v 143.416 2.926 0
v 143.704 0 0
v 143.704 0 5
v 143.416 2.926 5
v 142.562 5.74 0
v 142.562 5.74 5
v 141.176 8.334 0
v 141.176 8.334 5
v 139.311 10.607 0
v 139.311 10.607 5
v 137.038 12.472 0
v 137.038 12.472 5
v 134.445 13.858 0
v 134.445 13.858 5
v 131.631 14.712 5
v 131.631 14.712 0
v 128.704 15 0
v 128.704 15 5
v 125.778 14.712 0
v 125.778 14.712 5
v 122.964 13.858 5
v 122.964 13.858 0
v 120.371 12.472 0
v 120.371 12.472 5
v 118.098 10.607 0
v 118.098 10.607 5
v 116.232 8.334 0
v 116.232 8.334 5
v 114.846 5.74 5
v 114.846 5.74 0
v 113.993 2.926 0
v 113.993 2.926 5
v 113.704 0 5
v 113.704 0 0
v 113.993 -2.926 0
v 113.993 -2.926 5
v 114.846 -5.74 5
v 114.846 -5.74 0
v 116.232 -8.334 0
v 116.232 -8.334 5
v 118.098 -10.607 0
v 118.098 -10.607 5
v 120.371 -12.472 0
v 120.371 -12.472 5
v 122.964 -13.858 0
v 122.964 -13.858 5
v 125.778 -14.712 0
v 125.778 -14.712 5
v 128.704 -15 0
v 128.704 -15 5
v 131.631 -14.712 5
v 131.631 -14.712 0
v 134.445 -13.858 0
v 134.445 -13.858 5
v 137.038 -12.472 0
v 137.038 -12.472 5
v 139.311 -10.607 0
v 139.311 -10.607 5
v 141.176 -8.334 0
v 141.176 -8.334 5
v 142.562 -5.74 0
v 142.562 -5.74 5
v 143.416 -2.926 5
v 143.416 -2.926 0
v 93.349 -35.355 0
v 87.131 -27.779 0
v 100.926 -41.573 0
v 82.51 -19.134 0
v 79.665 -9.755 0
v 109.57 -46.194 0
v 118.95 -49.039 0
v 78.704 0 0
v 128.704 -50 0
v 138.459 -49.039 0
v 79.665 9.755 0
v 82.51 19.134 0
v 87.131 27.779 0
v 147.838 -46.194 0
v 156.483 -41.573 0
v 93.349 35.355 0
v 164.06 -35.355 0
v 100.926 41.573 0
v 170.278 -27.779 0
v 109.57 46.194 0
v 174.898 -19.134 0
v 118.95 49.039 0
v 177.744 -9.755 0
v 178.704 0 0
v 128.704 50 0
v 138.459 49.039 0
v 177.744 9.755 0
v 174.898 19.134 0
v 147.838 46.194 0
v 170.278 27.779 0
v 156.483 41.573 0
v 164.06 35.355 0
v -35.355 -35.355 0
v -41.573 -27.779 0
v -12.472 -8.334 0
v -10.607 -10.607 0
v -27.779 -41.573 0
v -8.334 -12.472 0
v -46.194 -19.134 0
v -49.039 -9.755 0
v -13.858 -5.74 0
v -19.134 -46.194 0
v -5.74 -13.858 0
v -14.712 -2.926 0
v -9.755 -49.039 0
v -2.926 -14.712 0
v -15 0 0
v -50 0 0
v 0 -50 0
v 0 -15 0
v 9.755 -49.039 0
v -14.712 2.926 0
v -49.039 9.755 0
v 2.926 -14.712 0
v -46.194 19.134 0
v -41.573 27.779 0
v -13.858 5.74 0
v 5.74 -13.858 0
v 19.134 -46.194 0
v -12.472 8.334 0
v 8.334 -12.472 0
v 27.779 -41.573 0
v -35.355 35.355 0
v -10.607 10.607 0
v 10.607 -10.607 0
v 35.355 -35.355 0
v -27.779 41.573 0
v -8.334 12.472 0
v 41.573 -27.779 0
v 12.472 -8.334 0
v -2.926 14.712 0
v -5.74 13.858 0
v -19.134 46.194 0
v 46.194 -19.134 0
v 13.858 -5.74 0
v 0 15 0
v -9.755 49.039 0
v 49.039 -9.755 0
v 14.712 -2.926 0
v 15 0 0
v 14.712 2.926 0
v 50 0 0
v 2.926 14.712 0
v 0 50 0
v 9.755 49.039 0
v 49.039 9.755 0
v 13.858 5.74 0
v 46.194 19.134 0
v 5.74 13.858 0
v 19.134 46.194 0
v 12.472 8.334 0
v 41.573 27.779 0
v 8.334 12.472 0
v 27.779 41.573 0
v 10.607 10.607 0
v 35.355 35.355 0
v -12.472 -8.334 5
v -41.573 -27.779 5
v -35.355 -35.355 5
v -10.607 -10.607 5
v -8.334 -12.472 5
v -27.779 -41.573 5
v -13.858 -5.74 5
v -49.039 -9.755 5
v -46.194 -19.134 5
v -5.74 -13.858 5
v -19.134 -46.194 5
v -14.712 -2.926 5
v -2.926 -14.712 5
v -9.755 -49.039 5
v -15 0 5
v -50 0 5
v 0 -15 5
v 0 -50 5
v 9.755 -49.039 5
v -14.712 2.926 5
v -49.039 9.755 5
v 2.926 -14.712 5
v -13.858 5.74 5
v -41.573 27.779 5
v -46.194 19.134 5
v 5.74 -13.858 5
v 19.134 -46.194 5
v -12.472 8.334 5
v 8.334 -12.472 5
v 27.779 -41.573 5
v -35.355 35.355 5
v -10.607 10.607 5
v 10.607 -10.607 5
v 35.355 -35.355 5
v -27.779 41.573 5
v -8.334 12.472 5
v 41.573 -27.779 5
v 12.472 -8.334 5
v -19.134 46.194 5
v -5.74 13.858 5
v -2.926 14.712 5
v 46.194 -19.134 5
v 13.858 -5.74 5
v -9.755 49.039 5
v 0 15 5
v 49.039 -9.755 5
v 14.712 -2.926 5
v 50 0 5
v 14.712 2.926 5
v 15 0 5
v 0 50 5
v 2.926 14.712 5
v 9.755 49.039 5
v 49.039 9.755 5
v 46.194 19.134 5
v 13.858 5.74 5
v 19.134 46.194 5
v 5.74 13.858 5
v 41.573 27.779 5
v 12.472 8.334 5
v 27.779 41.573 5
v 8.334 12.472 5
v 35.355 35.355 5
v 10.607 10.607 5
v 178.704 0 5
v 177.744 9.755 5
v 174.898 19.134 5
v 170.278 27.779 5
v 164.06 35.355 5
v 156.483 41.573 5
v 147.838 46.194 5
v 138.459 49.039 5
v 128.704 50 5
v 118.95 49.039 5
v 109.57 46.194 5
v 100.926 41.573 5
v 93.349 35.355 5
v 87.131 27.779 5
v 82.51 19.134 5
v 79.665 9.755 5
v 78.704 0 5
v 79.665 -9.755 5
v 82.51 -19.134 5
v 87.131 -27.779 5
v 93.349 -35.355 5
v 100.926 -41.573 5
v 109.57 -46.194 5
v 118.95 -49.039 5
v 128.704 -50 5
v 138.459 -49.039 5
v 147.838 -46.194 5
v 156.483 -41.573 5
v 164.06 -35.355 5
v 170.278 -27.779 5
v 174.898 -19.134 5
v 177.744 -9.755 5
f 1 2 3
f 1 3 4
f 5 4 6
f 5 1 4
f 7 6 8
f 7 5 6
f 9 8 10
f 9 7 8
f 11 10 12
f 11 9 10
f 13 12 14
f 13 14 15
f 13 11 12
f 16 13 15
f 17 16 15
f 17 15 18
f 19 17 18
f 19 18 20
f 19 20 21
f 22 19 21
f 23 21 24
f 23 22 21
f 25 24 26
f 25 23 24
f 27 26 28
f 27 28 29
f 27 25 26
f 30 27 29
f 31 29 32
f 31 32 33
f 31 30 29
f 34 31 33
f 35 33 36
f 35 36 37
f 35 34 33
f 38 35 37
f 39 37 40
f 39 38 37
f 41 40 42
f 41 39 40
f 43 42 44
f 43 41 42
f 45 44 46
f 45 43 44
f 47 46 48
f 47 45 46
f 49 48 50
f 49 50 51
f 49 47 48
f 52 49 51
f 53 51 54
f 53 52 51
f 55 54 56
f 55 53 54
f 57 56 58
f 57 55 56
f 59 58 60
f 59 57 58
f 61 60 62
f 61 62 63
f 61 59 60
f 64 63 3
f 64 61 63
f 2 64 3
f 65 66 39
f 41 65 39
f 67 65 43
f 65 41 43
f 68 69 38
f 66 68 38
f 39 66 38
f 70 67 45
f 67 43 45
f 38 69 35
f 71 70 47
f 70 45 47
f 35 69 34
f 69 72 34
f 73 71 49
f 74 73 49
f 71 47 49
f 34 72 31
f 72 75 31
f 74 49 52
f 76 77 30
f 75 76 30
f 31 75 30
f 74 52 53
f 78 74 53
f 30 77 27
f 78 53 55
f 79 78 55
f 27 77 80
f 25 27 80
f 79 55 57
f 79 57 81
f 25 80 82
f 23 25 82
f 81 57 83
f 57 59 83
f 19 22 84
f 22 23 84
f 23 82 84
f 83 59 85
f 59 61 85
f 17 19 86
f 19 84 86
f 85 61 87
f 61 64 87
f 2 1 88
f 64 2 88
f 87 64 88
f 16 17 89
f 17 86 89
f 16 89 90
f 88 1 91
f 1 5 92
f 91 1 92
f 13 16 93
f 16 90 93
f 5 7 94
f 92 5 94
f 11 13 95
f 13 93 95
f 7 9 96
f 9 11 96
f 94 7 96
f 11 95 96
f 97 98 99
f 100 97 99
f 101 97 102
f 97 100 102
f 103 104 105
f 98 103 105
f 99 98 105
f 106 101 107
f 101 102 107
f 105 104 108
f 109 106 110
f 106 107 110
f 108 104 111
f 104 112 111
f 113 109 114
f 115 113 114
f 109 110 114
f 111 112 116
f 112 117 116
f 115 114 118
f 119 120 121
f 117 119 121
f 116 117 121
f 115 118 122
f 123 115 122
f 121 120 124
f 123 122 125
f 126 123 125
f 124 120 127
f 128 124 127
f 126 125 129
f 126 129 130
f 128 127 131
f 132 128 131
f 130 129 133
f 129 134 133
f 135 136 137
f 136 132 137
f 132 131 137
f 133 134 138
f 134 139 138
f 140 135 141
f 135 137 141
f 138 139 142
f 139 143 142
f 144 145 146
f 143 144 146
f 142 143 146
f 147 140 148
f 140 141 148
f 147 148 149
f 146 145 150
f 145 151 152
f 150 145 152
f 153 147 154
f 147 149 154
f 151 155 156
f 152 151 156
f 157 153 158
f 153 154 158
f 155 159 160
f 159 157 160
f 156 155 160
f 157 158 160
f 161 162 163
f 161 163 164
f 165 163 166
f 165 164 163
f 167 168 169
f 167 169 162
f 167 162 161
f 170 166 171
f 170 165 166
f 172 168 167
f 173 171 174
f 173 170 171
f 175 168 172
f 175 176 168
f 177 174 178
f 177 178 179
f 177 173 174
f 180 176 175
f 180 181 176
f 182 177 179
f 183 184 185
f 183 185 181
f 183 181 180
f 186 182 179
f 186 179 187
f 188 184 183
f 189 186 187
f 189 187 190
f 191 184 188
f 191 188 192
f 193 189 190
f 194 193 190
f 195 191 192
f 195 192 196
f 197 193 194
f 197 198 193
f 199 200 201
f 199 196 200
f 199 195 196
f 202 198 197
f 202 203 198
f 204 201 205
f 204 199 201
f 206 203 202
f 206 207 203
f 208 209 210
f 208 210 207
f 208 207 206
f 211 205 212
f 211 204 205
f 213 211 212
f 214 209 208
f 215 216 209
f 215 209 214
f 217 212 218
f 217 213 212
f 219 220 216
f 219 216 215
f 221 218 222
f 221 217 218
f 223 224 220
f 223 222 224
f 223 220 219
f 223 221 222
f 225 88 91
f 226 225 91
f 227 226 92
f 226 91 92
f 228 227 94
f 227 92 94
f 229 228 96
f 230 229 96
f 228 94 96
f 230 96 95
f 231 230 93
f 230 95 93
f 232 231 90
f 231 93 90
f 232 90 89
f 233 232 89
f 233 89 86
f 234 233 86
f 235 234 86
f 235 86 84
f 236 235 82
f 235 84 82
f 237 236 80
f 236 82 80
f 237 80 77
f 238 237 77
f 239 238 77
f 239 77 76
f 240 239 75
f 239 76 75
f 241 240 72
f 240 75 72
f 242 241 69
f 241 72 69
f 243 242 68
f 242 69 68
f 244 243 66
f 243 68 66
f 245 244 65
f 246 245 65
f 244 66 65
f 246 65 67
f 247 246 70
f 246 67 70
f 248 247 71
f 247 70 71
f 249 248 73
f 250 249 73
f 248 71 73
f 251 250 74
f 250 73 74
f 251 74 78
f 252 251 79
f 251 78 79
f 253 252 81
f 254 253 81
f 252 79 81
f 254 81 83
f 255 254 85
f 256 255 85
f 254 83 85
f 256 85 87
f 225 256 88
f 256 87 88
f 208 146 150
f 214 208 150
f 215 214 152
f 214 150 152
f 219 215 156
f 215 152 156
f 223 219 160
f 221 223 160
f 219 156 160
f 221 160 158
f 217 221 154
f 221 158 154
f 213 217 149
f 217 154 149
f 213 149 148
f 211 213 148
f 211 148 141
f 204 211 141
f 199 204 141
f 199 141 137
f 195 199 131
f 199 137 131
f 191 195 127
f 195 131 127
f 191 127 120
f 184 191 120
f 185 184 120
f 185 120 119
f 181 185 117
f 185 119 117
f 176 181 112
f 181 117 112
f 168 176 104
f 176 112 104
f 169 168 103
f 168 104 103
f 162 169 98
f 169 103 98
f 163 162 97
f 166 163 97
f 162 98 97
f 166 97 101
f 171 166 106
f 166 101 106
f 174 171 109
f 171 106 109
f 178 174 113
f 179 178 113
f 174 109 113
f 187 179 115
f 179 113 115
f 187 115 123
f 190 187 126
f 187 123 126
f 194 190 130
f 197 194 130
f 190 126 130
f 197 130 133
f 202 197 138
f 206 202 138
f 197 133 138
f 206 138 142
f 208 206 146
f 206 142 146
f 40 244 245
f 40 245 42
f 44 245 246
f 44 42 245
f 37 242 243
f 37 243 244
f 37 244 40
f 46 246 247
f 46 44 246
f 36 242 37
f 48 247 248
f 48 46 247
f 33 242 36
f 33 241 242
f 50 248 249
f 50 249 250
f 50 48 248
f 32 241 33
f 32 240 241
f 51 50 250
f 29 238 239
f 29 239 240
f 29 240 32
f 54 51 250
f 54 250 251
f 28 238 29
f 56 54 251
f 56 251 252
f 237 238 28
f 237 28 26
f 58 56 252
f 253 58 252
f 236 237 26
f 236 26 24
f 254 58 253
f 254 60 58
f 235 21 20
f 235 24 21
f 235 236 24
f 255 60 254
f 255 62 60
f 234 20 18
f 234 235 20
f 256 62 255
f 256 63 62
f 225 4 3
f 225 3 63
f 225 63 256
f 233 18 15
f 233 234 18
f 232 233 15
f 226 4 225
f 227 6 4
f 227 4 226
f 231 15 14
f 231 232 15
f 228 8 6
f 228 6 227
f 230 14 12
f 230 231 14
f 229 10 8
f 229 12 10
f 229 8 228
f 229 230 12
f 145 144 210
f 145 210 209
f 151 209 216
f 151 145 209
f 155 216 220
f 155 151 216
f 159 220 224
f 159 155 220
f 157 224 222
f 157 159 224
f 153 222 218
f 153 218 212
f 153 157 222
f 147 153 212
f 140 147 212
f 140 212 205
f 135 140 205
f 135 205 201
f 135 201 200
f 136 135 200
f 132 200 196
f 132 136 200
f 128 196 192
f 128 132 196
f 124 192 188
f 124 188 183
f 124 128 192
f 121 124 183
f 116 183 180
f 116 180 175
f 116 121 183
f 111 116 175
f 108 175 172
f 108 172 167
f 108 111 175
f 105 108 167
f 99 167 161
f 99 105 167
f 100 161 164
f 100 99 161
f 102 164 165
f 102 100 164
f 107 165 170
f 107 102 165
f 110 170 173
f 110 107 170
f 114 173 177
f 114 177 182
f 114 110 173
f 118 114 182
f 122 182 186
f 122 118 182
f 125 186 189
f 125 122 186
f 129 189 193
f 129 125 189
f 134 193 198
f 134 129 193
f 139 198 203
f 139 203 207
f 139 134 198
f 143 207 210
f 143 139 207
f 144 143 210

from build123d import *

# Parameters (mm, degrees)
F0_R     = 50
F0_R_2   = 15
F1_DEPTH = 5


with BuildPart() as f1:
    # F0 (on Top) → F1 (new body)
    with BuildSketch(Plane.XY):
        Circle(F0_R)
        Circle(F0_R_2, mode=Mode.SUBTRACT)
        with Locations((128.704295, 0)):
            Circle(F0_R)
        with Locations((128.704295, 0)):
            Circle(F0_R_2, mode=Mode.SUBTRACT)
    extrude(amount=F1_DEPTH)


solid = f1.part
